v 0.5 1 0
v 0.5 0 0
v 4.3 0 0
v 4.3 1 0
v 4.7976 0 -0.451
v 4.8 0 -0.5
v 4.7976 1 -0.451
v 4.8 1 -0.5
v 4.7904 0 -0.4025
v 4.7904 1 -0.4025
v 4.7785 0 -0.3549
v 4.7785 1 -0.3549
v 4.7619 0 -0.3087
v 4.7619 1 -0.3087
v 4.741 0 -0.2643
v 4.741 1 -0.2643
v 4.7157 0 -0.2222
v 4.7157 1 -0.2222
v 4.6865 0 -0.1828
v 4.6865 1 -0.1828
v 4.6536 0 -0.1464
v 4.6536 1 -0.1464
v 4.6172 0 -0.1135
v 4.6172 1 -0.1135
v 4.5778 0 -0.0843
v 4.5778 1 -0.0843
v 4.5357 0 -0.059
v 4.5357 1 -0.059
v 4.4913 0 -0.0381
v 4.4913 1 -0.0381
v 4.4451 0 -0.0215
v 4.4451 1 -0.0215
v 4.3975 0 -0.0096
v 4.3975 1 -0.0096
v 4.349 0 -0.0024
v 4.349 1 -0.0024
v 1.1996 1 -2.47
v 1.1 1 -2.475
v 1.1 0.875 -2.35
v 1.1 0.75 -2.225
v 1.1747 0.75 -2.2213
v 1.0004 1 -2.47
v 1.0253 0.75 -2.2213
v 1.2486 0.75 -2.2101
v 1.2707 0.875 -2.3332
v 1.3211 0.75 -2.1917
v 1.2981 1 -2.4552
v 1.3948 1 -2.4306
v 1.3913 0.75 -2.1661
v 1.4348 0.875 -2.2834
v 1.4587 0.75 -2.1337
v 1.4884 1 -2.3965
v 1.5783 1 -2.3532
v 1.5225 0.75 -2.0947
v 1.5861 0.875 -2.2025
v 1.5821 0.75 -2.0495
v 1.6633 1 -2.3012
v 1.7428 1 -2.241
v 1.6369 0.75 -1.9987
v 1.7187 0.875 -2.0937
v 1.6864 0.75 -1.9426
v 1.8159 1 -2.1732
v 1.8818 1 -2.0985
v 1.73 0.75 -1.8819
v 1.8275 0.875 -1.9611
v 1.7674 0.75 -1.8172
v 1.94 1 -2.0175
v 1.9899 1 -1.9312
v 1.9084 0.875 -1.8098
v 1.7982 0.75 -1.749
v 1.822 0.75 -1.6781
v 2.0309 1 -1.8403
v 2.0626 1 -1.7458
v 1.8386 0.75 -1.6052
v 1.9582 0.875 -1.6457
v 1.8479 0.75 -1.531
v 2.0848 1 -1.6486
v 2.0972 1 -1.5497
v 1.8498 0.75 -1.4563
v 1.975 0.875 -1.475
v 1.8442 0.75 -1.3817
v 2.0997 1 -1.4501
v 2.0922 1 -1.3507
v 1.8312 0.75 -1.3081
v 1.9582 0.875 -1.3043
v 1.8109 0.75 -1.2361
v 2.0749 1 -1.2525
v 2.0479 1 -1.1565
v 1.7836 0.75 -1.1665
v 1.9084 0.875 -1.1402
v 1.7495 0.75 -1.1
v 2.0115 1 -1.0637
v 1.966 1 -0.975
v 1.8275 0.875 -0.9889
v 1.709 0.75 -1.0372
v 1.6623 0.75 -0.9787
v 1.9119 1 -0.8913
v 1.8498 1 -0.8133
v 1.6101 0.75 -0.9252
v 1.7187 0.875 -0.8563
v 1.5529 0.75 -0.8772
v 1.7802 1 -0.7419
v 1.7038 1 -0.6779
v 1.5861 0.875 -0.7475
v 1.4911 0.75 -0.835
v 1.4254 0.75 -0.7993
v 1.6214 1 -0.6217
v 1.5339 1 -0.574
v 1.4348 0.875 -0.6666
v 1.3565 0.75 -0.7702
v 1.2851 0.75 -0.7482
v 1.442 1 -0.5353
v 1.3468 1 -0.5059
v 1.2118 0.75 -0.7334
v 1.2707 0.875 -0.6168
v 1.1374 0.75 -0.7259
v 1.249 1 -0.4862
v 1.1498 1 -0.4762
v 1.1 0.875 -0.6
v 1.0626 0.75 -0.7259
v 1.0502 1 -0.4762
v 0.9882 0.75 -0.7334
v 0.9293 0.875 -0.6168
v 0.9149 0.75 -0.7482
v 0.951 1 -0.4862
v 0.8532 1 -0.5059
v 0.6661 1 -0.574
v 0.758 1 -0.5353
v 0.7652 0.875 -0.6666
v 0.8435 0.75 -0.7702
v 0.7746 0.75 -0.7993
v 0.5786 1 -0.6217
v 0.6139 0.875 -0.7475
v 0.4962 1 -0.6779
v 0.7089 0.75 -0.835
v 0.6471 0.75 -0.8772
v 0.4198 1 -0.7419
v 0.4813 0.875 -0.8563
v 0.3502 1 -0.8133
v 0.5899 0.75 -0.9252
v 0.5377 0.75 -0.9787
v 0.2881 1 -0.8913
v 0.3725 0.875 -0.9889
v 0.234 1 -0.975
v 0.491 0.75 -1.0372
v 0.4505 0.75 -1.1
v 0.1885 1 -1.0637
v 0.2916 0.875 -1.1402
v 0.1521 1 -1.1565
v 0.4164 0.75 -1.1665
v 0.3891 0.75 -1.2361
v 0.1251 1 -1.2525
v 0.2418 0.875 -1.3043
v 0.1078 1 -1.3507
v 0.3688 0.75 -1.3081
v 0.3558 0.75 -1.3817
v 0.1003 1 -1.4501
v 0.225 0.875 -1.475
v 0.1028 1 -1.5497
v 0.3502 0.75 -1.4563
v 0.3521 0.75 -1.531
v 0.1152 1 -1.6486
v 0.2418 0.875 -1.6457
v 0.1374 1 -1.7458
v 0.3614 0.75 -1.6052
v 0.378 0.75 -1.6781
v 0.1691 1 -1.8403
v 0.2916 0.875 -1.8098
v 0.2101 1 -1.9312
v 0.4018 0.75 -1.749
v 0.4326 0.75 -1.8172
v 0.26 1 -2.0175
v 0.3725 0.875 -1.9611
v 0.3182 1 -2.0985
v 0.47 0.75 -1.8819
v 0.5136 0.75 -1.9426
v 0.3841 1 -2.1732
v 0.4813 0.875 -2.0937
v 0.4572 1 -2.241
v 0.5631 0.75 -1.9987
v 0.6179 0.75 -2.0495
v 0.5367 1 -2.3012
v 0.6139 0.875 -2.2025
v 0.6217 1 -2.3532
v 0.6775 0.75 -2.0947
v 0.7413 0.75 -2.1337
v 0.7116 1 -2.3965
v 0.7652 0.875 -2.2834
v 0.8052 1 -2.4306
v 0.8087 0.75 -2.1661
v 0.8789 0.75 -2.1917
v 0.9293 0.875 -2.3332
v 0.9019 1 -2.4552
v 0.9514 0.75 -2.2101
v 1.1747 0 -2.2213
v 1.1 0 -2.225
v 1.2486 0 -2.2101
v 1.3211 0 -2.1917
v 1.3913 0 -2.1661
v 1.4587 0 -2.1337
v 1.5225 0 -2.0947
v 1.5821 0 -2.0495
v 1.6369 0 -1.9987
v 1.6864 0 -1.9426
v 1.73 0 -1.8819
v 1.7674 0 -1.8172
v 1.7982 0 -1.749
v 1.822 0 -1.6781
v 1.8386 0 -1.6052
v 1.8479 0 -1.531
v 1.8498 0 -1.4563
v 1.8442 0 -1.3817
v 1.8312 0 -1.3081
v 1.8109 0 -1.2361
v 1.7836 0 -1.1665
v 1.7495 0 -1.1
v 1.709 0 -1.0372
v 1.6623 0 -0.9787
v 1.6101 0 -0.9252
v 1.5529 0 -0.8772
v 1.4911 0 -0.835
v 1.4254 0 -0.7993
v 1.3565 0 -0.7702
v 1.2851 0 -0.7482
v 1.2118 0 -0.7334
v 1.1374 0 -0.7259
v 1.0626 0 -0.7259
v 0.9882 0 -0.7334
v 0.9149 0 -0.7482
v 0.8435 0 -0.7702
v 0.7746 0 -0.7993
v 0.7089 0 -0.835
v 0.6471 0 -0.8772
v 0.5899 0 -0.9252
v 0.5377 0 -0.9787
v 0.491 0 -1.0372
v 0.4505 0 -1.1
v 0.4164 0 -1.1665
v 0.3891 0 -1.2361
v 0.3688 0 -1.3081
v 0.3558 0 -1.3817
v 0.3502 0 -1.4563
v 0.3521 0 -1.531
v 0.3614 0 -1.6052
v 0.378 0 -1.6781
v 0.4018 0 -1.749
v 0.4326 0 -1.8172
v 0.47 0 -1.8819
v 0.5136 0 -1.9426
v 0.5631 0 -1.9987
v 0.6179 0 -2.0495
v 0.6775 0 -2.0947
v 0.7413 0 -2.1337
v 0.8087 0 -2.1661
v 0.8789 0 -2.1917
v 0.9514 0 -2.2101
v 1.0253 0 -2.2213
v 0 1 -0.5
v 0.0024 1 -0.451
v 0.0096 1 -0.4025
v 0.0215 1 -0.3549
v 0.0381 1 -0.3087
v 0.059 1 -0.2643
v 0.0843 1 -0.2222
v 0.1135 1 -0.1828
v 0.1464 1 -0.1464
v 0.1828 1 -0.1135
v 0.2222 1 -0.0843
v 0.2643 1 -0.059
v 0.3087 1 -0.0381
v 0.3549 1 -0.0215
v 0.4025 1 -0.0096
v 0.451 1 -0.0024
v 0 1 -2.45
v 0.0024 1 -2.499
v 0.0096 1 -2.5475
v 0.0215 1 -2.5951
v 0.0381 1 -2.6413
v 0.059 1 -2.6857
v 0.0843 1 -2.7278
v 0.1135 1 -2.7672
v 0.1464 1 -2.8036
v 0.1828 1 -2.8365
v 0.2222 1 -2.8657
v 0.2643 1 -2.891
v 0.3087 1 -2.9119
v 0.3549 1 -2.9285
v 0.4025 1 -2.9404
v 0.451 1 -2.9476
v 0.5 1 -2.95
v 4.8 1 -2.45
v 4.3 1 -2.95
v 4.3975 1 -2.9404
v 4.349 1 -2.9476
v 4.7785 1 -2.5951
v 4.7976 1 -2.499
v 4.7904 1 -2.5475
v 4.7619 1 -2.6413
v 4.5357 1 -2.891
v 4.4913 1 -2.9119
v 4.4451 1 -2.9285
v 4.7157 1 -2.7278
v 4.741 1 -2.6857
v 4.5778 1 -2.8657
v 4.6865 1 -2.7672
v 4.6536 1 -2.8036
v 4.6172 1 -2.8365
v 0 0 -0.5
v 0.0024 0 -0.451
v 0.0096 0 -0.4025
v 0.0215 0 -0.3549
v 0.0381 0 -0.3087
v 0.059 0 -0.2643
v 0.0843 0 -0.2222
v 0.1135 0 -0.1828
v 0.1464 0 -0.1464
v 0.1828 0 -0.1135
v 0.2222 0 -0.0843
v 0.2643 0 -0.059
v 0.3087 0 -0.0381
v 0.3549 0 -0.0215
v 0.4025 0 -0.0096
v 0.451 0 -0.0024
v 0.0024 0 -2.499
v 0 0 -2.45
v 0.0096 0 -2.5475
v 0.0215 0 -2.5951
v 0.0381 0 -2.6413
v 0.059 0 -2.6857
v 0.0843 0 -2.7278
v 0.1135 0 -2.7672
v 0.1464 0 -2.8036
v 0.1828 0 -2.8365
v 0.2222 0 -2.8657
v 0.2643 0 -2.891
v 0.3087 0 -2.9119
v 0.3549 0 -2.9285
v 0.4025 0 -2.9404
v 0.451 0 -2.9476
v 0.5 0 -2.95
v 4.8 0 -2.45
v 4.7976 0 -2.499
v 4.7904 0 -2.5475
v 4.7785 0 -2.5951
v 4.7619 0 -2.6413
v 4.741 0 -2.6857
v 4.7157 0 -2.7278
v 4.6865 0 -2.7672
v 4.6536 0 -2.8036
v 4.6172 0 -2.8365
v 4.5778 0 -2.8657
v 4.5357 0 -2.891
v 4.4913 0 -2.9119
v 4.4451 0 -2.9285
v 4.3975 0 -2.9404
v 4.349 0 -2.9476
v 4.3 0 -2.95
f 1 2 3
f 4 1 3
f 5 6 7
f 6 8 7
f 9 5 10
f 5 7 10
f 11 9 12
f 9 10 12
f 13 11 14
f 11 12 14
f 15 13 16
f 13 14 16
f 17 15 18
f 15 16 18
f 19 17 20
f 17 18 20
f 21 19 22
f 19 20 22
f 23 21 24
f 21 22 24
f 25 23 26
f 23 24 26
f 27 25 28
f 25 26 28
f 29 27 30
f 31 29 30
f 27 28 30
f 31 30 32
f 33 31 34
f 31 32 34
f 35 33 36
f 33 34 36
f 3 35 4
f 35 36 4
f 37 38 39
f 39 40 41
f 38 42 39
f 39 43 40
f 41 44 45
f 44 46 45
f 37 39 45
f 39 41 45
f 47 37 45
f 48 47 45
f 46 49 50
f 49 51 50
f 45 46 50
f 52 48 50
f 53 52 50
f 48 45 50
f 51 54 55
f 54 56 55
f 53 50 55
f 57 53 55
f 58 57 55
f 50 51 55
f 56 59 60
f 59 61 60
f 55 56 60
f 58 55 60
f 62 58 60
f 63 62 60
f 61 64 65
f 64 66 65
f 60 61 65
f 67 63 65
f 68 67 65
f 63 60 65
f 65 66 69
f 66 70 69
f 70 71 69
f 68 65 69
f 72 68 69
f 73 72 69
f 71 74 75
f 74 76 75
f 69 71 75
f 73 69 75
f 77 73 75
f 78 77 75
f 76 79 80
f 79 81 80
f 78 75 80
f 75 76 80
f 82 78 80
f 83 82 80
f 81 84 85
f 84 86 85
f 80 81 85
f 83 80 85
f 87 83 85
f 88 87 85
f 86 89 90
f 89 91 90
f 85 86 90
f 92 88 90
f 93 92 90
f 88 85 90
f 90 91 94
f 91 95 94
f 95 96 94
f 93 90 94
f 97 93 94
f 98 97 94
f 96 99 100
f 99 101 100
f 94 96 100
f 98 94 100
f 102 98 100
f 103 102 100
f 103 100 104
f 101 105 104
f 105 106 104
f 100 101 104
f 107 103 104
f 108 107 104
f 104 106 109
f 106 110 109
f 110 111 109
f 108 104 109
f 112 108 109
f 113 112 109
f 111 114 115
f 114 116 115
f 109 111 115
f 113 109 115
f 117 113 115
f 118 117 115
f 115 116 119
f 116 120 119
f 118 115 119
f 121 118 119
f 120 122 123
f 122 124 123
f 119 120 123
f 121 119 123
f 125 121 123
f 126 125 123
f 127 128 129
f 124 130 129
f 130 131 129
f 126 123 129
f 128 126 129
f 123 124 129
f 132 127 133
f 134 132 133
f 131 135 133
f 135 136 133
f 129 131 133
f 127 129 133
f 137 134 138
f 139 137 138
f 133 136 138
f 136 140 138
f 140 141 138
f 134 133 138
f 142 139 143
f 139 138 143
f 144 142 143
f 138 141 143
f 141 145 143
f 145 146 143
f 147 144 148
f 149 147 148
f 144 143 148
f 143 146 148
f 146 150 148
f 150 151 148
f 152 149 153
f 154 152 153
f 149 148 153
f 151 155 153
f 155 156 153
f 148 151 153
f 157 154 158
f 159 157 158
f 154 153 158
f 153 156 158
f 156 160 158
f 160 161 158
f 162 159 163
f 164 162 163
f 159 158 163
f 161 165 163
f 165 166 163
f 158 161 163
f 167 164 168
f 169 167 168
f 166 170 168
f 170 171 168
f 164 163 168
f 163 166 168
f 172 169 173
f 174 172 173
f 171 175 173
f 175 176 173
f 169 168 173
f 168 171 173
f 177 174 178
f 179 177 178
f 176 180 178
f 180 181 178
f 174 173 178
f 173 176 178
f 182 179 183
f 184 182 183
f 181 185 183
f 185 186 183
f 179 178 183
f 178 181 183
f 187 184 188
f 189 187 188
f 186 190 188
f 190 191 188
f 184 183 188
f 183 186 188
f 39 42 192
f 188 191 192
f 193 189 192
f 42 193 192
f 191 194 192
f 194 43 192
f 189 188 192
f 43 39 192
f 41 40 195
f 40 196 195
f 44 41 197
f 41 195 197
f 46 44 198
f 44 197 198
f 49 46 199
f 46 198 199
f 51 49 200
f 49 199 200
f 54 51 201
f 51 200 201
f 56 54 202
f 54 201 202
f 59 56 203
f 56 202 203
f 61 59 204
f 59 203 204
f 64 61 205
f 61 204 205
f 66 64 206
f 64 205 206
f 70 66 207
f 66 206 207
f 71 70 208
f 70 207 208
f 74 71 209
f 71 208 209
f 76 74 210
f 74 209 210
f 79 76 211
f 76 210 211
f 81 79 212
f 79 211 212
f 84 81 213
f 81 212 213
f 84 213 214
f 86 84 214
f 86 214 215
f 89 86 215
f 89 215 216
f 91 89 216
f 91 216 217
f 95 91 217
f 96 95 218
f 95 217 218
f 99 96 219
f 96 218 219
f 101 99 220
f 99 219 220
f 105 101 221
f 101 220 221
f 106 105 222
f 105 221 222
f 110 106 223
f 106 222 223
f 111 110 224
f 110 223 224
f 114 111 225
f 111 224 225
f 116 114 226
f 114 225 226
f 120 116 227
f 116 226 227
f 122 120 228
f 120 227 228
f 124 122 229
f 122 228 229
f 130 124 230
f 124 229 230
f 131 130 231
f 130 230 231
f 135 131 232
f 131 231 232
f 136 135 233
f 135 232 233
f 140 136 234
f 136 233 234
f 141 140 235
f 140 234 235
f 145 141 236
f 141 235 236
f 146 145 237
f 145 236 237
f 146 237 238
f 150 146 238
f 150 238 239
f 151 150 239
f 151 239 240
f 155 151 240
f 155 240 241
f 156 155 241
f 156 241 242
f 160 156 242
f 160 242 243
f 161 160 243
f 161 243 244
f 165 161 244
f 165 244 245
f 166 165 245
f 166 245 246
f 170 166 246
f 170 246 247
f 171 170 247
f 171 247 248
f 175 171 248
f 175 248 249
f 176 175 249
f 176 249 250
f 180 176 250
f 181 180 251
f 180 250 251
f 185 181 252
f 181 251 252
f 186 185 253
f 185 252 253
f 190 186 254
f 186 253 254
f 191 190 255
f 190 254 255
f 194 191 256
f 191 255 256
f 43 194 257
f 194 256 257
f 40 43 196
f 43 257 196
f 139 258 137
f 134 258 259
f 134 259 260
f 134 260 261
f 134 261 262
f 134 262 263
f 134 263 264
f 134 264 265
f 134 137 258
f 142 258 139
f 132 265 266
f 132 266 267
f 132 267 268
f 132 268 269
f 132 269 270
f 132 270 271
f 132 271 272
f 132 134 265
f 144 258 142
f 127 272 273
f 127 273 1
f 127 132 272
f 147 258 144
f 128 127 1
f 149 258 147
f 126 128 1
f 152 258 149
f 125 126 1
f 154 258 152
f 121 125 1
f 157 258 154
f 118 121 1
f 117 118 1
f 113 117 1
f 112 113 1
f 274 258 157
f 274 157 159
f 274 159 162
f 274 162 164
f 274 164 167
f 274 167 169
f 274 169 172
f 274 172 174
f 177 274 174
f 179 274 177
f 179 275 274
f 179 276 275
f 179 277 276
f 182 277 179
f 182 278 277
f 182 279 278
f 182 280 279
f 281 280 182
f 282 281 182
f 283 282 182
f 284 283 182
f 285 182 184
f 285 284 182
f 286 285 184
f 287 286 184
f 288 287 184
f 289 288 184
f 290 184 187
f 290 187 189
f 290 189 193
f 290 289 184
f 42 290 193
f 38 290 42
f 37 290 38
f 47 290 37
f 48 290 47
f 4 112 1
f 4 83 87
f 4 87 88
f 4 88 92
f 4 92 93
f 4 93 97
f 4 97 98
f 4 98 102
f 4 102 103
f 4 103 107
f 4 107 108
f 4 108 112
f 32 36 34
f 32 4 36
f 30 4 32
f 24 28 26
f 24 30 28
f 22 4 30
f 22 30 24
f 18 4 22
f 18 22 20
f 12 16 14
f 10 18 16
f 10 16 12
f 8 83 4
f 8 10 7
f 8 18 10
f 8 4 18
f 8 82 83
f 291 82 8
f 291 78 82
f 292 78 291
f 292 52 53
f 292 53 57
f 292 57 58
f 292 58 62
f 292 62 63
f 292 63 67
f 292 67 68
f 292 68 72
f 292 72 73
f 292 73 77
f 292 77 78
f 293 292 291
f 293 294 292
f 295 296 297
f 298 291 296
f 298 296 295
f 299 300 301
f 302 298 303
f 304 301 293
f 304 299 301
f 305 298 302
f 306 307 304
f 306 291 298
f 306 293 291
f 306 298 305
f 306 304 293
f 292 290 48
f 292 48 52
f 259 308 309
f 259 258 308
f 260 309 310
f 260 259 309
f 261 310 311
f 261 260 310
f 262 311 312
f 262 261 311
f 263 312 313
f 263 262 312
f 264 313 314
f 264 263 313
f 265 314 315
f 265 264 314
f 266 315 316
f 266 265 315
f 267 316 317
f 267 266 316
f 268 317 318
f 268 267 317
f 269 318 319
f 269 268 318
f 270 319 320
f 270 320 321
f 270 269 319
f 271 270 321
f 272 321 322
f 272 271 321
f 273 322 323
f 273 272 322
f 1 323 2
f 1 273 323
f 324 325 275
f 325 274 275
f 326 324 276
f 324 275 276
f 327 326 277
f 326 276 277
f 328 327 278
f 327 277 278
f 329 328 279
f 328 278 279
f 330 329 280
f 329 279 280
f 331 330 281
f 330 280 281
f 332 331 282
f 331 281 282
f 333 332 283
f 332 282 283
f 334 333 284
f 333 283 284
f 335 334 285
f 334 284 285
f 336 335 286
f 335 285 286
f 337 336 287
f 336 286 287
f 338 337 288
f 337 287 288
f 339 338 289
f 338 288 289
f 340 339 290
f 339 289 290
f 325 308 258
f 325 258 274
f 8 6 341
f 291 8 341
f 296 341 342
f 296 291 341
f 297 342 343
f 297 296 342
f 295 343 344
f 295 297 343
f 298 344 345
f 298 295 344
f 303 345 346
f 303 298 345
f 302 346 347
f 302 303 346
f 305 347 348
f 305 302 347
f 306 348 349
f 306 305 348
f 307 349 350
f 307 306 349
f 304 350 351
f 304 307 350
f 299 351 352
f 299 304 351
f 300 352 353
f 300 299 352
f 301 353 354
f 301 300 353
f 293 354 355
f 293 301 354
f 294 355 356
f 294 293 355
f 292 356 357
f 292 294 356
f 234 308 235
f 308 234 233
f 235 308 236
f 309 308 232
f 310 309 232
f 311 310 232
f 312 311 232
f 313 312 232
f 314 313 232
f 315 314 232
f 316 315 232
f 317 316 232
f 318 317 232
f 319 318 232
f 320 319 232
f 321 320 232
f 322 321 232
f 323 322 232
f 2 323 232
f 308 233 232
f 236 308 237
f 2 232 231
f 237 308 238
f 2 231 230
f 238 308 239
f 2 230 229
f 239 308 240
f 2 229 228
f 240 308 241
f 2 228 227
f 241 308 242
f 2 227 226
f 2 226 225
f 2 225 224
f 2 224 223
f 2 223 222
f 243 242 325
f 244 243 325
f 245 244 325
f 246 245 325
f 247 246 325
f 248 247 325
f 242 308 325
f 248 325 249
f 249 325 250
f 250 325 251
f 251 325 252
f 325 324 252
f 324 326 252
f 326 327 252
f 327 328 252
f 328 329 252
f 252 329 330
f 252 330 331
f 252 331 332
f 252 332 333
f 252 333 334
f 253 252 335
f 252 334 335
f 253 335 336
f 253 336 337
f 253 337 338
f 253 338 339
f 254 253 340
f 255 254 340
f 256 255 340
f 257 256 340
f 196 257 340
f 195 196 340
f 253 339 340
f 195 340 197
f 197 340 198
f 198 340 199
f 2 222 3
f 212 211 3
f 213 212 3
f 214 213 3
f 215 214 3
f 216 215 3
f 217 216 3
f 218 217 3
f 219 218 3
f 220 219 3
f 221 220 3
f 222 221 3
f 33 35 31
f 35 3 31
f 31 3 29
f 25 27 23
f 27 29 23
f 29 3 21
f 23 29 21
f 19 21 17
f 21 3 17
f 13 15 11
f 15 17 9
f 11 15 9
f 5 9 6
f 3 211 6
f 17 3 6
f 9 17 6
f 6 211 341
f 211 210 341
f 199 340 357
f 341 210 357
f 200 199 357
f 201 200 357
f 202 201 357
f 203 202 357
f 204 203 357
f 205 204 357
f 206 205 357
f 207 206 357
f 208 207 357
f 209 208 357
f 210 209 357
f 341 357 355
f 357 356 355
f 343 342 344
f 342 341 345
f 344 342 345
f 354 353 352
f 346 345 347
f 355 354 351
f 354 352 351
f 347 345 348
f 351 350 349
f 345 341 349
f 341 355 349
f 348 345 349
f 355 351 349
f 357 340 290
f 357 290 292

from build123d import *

# Parameters (mm, degrees)
SKETCH1_W                                       = 4.8
SKETCH1_H                                       = 2.95
BOSS_EXTRUDE1_DEPTH                             = 1
CSK_FOR_M2_FLAT_HEAD_MACHINE_SCREW1_D           = 1.5
CSK_FOR_M2_FLAT_HEAD_MACHINE_SCREW1_CSINK_D     = 2
CSK_FOR_M2_FLAT_HEAD_MACHINE_SCREW1_CSINK_ANGLE = 90
FILLET1_R                                       = 0.5


with BuildPart() as part:
    # Sketch1 → Boss-Extrude1 (new body)
    with BuildSketch(Plane(origin=(0, 0, 0), x_dir=(1, 0, 0), z_dir=(0, 1, 0))):
        with Locations((2.4, 1.475)):
            Rectangle(SKETCH1_W, SKETCH1_H)
    extrude(amount=BOSS_EXTRUDE1_DEPTH)

    # CSK for M2 Flat Head Machine Screw1 (through all)
    with Locations(Plane(origin=(1.1, 1, -1.475), x_dir=(0, 0, 1), z_dir=(0, 1, 0))):
        with Locations((0, 0)):
            CounterSinkHole(CSK_FOR_M2_FLAT_HEAD_MACHINE_SCREW1_D / 2, CSK_FOR_M2_FLAT_HEAD_MACHINE_SCREW1_CSINK_D / 2, counter_sink_angle=CSK_FOR_M2_FLAT_HEAD_MACHINE_SCREW1_CSINK_ANGLE)

    # Fillet1
    fillet1_edges = [part.edges().sort_by_distance(p)[0] for p in [
        (0, 0.5, -2.95),
        (4.8, 0.5, -2.95),
        (4.8, 0.5, 0),
        (0, 0.5, 0),
    ]]
    fillet(fillet1_edges, radius=FILLET1_R)


solid = part.part
